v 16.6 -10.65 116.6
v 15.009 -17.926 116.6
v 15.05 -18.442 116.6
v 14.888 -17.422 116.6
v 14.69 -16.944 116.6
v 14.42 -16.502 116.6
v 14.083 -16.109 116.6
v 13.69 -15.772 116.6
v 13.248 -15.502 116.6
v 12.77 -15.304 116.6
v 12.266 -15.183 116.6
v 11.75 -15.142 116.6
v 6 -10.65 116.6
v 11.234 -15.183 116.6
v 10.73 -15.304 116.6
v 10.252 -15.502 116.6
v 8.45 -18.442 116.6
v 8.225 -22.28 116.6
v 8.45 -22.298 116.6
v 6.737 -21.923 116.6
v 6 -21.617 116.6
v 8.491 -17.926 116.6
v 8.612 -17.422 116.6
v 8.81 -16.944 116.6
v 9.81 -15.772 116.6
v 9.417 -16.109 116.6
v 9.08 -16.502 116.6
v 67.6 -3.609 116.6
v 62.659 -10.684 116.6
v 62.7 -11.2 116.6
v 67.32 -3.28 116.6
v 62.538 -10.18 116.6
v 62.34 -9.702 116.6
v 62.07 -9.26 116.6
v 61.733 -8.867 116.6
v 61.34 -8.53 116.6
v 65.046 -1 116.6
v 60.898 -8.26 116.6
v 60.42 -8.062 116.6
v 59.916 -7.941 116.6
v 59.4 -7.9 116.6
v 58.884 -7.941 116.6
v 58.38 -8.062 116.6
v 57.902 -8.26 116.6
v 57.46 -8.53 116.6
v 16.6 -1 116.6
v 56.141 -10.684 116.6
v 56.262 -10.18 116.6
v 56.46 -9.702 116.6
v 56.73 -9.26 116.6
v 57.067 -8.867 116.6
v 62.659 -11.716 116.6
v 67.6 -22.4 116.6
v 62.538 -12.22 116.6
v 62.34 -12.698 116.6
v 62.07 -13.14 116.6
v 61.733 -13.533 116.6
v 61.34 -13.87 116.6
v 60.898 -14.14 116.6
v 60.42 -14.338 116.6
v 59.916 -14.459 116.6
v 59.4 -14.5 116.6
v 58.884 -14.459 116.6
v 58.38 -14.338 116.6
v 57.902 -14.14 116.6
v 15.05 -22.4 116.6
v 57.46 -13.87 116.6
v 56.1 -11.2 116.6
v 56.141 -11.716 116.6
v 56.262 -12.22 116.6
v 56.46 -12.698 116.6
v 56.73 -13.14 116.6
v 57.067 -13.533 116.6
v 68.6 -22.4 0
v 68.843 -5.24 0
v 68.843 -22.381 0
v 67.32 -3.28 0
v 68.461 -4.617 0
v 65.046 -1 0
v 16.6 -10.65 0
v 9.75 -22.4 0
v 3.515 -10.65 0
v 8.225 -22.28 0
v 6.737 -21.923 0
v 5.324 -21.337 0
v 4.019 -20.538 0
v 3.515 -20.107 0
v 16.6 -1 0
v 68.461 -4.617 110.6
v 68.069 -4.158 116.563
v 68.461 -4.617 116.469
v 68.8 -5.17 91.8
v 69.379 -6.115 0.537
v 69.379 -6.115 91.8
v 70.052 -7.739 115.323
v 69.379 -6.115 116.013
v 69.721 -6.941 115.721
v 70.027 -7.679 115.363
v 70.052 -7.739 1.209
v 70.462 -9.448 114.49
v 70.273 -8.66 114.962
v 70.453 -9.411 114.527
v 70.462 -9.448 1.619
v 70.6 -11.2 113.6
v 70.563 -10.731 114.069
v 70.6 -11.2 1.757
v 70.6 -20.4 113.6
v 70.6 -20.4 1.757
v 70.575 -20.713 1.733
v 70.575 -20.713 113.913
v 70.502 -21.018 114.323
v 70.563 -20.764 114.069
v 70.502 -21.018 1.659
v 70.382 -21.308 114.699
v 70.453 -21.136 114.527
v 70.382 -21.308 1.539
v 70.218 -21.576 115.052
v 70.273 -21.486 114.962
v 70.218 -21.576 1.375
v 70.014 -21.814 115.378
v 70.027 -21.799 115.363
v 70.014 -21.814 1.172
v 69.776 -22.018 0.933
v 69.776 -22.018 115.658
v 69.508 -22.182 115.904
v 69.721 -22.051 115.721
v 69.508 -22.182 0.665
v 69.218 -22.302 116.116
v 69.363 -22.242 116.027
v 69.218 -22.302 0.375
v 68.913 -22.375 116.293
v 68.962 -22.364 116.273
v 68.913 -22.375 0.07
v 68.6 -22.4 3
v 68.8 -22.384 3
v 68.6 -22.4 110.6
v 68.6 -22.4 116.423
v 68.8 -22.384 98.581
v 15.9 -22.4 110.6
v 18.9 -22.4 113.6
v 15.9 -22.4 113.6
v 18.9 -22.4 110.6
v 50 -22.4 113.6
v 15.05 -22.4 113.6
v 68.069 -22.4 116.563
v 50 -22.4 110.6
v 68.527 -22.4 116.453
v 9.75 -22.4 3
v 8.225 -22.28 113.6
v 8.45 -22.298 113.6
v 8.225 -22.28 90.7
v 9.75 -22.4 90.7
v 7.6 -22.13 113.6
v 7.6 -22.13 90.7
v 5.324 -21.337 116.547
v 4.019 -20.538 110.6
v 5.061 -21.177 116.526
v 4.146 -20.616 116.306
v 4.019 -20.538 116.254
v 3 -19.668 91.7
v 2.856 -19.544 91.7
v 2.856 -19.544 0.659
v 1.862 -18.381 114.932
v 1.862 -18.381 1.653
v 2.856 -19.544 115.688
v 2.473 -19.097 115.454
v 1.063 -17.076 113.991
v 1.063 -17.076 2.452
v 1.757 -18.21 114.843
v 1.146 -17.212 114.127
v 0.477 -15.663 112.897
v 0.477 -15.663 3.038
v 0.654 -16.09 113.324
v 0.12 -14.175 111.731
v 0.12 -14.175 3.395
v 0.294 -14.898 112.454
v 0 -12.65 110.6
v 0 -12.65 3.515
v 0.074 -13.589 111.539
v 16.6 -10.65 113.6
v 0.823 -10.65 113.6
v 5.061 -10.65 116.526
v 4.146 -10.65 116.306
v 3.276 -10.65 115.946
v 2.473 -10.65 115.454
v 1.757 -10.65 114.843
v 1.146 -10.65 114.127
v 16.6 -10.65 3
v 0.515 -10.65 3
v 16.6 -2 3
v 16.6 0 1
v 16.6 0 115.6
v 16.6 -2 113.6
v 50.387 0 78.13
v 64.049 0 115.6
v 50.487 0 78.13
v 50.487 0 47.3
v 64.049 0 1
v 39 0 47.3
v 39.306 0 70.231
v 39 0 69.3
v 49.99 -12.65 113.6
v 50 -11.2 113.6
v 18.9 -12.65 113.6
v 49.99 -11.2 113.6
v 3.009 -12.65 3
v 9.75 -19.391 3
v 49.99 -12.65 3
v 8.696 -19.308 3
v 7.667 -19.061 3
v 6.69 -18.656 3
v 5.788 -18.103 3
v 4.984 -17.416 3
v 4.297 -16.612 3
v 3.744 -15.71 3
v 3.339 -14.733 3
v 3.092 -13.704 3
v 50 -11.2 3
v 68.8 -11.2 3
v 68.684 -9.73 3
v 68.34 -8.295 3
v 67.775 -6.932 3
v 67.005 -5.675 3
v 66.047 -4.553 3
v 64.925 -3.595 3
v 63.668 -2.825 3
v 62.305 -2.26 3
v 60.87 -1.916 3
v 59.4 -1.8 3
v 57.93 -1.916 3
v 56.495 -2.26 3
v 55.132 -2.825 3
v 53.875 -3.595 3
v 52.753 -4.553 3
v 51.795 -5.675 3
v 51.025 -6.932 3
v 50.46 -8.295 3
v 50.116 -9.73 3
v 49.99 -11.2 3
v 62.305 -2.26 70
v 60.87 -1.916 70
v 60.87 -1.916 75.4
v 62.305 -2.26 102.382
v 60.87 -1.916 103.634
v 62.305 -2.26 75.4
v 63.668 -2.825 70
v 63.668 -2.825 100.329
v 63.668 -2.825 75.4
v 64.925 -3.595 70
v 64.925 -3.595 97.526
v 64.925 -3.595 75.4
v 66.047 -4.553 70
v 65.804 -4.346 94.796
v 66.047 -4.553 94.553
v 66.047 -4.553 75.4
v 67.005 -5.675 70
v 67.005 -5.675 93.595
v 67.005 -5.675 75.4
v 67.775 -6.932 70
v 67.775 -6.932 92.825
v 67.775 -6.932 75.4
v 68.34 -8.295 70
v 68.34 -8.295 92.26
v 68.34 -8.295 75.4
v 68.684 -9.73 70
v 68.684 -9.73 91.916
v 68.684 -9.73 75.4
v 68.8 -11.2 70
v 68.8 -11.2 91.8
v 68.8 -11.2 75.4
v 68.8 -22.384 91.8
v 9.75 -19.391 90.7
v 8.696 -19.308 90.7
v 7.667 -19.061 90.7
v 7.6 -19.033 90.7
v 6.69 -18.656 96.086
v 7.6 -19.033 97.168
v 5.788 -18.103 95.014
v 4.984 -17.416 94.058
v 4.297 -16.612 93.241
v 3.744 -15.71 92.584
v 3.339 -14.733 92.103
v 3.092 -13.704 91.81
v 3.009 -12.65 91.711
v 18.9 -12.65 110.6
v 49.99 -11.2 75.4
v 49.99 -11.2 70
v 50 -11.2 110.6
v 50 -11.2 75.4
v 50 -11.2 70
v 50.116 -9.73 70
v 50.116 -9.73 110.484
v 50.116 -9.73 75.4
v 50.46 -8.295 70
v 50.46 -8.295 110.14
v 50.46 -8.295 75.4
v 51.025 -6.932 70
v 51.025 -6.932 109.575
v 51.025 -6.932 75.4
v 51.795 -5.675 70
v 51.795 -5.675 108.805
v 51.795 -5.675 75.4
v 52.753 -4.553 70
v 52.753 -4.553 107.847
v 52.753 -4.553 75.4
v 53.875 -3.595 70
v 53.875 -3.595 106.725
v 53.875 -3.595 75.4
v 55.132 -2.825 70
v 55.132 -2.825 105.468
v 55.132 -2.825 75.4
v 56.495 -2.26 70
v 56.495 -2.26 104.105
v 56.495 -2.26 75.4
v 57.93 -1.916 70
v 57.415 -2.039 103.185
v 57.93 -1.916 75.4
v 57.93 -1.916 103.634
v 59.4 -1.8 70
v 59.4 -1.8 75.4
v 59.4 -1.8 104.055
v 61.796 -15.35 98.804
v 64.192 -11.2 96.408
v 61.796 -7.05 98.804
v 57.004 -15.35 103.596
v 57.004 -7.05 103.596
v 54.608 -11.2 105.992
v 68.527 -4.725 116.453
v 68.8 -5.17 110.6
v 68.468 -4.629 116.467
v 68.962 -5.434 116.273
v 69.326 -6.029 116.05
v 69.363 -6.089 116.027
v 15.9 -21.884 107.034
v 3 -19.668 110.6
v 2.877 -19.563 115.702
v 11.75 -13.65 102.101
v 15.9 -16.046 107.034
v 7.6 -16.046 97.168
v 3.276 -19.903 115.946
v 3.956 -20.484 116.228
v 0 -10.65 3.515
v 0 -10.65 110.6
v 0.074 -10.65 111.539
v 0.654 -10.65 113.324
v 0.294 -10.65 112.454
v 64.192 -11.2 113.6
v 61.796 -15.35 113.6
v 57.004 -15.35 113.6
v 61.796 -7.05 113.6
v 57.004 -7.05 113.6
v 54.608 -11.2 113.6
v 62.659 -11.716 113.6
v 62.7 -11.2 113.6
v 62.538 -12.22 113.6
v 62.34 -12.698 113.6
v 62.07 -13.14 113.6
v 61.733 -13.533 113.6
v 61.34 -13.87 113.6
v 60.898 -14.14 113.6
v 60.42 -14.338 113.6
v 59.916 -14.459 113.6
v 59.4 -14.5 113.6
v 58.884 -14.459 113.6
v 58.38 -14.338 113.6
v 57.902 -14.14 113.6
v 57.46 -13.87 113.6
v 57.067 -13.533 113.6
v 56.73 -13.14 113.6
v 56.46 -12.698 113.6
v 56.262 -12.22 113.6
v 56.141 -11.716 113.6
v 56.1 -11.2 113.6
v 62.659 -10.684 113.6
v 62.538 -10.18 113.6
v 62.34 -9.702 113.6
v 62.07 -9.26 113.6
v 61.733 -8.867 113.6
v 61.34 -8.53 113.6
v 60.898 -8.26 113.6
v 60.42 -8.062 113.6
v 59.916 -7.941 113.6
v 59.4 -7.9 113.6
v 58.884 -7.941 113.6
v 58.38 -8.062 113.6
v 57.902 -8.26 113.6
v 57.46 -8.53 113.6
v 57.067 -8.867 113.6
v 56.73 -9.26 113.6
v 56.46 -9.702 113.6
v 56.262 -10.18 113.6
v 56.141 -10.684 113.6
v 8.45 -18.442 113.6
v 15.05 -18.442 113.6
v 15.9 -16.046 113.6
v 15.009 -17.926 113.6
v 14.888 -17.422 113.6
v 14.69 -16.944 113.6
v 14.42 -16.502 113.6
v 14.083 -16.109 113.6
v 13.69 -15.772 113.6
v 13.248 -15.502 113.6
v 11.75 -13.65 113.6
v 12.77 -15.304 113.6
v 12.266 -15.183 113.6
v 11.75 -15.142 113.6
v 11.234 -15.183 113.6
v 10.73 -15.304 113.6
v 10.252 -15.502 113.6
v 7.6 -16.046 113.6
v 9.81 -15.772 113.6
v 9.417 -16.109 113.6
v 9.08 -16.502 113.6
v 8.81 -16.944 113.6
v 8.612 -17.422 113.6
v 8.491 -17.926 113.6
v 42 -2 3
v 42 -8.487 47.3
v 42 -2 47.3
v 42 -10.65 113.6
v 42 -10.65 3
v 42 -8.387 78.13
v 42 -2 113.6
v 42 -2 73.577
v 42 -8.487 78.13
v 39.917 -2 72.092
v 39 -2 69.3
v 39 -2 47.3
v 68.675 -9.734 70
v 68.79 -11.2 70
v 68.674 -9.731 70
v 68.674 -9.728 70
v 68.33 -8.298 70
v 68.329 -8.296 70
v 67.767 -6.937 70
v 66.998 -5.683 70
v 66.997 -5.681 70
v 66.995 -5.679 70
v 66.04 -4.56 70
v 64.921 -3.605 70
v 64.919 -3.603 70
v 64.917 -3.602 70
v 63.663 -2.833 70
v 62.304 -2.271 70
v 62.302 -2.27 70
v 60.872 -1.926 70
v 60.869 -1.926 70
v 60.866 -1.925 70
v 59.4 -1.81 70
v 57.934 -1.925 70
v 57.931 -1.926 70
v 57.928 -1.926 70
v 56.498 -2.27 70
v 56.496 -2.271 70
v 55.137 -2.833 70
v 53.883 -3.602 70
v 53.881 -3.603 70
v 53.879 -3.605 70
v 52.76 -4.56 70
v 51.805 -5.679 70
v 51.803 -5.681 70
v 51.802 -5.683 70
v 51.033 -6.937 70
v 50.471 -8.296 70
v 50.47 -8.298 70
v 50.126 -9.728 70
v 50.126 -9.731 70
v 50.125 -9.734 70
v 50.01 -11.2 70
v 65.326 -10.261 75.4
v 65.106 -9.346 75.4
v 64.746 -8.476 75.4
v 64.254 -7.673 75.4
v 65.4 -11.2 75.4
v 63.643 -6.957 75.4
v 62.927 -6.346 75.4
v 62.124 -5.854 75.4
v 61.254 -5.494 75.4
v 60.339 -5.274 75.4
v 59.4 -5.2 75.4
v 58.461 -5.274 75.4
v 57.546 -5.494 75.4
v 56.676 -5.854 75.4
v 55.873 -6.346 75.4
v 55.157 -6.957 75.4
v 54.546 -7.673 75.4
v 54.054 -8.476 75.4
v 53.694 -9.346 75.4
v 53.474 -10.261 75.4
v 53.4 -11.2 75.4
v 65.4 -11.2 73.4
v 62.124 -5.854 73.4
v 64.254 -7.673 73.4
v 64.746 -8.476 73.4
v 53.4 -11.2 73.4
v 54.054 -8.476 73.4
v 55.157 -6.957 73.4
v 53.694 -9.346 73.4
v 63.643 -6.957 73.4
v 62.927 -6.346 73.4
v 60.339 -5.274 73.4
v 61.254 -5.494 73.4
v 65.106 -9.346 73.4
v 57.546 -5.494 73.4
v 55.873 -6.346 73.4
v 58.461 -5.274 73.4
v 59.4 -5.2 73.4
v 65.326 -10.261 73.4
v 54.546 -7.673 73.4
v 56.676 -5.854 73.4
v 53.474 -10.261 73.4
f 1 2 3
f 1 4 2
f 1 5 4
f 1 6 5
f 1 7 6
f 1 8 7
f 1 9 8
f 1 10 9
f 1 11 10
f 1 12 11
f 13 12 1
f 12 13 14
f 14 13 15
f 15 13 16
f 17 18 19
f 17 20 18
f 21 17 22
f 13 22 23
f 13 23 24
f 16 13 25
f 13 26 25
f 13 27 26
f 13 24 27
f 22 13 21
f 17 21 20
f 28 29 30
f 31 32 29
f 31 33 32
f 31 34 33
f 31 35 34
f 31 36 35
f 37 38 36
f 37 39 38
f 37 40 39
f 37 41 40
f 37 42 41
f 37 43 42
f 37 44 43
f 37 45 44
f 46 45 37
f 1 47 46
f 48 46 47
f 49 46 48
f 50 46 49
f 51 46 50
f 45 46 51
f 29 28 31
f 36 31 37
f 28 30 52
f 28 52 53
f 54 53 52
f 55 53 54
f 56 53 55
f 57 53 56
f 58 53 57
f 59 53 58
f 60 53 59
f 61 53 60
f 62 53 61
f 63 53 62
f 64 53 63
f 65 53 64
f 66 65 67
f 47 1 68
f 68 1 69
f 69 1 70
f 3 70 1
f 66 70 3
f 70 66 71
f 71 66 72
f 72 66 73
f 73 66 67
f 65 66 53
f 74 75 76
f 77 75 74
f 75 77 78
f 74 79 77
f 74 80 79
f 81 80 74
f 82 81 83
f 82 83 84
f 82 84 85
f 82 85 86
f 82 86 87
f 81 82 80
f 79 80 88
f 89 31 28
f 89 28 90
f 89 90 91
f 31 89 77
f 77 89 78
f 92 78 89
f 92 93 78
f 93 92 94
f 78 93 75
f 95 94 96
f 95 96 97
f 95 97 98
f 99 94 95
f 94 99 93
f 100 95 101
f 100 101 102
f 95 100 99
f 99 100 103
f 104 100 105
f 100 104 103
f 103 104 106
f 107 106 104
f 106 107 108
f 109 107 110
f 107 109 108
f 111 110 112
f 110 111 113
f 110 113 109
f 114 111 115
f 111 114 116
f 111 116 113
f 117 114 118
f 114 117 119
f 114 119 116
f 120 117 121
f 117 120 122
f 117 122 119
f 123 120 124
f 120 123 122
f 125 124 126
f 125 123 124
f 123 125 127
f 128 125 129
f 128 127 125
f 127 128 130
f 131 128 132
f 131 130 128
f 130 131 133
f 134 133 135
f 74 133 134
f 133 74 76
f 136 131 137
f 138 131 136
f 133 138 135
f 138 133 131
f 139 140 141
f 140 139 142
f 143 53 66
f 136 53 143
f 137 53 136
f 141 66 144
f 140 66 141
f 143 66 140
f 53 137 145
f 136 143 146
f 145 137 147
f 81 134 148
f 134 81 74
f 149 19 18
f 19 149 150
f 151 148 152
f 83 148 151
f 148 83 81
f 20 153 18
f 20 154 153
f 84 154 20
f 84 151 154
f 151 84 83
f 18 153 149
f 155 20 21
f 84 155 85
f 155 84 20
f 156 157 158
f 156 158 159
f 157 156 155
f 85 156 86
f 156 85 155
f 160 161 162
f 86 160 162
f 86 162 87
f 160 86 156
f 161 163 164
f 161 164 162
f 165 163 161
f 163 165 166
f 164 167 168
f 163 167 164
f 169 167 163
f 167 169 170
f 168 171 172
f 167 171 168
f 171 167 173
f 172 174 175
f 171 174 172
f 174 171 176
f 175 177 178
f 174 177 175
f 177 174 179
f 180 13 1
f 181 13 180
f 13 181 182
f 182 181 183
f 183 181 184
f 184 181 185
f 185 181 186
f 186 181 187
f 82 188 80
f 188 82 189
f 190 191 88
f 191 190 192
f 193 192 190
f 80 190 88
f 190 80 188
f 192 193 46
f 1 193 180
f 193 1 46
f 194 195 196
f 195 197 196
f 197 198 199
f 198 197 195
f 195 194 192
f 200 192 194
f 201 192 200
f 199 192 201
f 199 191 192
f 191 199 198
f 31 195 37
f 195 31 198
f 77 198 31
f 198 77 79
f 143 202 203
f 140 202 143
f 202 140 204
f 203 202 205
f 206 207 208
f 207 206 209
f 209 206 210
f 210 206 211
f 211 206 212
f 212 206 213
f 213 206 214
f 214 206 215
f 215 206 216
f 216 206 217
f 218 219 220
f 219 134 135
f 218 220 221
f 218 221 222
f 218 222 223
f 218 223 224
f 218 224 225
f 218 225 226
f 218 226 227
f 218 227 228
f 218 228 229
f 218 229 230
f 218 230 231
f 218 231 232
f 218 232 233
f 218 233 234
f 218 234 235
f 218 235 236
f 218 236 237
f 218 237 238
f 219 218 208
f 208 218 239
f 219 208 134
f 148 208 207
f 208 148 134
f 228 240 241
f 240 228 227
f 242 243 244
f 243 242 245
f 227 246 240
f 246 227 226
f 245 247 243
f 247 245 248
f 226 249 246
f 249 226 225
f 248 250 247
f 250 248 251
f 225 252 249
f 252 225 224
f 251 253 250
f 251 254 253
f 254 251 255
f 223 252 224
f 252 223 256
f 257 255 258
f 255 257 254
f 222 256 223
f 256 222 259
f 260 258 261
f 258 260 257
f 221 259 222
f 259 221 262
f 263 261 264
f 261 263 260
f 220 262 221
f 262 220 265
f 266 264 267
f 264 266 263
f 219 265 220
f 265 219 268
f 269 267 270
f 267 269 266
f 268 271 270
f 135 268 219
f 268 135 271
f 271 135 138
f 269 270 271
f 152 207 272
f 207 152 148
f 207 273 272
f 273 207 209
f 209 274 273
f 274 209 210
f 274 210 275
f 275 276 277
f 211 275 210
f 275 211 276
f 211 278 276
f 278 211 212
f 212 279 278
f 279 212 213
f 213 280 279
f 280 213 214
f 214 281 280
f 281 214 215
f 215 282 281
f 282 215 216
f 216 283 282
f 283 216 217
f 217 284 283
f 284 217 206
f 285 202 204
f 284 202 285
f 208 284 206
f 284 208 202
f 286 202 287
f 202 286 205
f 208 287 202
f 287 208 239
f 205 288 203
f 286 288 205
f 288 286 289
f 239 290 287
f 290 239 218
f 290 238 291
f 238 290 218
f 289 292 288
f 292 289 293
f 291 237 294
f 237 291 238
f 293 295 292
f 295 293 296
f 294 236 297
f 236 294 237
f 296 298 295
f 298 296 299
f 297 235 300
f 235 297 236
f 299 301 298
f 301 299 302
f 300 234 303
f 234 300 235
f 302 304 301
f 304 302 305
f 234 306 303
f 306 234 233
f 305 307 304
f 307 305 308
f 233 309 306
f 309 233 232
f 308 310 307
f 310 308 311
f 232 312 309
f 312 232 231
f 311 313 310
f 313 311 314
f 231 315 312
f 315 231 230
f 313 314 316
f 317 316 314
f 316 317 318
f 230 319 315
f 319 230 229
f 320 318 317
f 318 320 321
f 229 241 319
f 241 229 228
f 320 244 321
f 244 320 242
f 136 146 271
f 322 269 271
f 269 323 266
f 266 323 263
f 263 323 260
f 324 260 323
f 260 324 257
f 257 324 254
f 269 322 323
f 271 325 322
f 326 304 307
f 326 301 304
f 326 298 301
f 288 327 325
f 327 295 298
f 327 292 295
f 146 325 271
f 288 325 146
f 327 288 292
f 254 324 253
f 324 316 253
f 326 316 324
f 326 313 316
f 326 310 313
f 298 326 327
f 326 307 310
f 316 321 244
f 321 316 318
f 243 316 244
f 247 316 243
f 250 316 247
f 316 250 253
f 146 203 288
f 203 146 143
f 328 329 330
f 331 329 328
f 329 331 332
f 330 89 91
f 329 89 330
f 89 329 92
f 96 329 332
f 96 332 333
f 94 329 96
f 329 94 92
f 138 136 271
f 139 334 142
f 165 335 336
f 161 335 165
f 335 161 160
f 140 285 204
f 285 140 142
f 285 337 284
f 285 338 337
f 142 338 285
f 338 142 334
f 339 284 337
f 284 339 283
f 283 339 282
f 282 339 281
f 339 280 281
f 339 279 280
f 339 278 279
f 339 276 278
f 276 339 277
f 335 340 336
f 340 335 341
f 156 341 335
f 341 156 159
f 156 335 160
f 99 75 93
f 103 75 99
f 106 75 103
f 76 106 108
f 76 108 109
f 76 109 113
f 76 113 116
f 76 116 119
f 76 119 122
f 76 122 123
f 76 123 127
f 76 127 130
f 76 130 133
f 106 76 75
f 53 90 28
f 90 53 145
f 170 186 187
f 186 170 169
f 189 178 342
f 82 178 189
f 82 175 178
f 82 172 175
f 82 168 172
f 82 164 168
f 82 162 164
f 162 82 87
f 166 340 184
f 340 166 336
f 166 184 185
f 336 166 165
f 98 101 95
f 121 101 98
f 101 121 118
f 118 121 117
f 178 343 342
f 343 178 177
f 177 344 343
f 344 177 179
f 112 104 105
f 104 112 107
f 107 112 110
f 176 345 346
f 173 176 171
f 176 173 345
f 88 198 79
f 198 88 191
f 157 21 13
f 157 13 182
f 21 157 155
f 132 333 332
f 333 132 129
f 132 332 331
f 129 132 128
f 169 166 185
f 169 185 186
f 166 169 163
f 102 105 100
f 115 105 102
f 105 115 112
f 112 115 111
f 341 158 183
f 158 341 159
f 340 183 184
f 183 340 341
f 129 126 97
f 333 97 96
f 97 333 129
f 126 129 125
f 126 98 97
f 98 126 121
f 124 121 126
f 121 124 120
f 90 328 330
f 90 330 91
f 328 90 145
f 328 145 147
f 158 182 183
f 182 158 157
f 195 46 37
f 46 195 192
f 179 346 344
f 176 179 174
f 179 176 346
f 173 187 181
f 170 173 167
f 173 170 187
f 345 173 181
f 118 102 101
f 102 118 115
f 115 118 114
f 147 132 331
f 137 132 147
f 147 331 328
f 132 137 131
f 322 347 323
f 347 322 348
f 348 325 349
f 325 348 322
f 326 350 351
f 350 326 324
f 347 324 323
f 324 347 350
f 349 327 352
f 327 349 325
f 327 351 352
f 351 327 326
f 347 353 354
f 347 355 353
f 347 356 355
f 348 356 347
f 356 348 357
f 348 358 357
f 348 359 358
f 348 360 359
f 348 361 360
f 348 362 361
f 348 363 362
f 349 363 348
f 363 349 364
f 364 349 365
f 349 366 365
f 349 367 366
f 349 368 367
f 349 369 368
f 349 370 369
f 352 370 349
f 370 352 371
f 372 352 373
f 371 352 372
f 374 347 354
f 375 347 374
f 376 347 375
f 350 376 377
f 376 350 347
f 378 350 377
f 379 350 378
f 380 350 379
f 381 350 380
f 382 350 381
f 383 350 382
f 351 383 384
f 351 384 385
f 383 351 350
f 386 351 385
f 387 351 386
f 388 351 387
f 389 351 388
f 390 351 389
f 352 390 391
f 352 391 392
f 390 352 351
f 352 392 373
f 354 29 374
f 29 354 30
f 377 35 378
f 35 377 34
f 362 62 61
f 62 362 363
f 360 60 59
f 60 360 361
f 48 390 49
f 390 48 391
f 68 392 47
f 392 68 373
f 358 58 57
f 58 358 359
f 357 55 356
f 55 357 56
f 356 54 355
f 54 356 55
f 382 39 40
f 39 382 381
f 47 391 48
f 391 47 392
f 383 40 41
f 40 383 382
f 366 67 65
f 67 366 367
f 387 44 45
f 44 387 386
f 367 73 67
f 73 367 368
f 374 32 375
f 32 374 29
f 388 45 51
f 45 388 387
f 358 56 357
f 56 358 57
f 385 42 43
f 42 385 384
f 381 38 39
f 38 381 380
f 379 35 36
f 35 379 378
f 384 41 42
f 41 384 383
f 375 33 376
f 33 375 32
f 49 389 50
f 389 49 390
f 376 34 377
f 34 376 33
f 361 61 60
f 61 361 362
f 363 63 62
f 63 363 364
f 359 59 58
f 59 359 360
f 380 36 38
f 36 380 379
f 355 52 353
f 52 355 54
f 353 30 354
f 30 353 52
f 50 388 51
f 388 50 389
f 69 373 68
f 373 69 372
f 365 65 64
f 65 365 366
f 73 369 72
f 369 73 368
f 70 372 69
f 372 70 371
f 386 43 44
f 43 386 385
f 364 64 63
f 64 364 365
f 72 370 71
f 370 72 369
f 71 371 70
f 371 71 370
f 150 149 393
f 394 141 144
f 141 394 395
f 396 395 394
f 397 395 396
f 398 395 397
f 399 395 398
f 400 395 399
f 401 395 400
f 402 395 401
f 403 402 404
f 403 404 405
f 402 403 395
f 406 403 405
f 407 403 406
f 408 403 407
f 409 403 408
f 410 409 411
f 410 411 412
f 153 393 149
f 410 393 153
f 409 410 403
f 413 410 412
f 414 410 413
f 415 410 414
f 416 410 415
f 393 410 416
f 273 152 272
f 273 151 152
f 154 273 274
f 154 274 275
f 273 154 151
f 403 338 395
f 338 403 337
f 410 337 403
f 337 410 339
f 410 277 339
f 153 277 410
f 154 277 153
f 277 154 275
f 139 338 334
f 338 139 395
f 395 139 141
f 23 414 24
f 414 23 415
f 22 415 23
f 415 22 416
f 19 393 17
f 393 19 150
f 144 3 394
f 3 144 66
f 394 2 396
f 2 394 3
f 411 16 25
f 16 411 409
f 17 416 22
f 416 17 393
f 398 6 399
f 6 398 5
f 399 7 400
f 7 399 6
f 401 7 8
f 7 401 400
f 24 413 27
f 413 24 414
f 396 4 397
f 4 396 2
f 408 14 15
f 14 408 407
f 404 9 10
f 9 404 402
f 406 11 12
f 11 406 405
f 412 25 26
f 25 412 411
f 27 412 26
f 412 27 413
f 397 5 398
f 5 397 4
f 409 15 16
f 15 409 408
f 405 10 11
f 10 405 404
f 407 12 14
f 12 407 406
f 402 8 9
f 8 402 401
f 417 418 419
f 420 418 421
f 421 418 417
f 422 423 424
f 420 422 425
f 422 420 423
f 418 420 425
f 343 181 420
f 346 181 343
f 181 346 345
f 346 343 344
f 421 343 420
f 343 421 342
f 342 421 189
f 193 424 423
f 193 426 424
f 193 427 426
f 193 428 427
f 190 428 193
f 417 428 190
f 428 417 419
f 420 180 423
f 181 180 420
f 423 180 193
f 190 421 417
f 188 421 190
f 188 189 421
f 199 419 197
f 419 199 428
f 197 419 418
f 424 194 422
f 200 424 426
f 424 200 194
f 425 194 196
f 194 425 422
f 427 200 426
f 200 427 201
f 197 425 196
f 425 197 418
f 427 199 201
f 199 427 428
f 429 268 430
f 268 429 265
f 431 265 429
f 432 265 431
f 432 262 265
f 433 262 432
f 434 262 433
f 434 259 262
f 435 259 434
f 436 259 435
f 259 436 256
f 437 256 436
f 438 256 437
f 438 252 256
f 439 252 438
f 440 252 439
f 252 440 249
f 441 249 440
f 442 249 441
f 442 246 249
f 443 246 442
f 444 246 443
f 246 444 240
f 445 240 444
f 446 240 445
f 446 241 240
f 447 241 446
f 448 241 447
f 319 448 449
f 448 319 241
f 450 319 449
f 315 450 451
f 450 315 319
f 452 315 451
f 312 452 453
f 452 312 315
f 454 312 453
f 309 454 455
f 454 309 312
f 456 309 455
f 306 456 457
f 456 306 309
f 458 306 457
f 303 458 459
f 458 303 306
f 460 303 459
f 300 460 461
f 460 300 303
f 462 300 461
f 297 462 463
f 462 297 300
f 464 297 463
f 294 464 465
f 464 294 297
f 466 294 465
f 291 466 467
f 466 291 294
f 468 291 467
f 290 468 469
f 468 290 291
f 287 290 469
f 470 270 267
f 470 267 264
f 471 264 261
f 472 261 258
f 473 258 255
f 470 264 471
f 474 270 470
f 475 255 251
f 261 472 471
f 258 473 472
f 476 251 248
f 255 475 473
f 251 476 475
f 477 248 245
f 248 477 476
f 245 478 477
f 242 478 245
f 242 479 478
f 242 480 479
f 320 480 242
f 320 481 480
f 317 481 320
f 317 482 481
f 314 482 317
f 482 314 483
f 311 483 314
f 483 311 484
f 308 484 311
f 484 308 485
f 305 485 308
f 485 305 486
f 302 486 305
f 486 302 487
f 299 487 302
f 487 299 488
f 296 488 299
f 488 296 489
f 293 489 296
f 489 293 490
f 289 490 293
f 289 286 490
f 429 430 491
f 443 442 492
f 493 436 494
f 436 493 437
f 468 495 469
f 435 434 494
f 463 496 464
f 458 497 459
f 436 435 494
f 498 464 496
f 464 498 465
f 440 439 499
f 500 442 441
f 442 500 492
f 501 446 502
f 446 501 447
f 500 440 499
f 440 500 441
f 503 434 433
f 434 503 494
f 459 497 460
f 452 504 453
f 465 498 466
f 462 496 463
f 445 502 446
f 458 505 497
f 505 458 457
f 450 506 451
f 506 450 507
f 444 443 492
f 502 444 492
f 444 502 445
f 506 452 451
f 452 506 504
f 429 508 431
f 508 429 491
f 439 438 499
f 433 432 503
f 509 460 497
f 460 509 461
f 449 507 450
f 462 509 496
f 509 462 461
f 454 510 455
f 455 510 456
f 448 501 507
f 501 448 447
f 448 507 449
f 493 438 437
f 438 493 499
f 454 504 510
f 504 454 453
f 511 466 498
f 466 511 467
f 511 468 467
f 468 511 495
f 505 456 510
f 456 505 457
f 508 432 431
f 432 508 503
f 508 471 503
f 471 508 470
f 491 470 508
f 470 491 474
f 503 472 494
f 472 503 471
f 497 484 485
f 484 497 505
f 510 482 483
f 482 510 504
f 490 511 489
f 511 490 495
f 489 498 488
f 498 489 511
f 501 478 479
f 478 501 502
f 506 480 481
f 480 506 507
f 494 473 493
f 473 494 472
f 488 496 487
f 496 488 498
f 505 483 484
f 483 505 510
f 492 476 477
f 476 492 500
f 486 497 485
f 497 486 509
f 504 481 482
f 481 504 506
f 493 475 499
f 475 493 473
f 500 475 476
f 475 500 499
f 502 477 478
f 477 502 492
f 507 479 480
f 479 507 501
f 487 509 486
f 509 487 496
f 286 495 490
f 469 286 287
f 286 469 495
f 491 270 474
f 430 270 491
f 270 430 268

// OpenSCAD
include <../lib/kobo-meshcore-case-lib.scad>;
$fn = 40;
color("#3b6fb6") grip();
